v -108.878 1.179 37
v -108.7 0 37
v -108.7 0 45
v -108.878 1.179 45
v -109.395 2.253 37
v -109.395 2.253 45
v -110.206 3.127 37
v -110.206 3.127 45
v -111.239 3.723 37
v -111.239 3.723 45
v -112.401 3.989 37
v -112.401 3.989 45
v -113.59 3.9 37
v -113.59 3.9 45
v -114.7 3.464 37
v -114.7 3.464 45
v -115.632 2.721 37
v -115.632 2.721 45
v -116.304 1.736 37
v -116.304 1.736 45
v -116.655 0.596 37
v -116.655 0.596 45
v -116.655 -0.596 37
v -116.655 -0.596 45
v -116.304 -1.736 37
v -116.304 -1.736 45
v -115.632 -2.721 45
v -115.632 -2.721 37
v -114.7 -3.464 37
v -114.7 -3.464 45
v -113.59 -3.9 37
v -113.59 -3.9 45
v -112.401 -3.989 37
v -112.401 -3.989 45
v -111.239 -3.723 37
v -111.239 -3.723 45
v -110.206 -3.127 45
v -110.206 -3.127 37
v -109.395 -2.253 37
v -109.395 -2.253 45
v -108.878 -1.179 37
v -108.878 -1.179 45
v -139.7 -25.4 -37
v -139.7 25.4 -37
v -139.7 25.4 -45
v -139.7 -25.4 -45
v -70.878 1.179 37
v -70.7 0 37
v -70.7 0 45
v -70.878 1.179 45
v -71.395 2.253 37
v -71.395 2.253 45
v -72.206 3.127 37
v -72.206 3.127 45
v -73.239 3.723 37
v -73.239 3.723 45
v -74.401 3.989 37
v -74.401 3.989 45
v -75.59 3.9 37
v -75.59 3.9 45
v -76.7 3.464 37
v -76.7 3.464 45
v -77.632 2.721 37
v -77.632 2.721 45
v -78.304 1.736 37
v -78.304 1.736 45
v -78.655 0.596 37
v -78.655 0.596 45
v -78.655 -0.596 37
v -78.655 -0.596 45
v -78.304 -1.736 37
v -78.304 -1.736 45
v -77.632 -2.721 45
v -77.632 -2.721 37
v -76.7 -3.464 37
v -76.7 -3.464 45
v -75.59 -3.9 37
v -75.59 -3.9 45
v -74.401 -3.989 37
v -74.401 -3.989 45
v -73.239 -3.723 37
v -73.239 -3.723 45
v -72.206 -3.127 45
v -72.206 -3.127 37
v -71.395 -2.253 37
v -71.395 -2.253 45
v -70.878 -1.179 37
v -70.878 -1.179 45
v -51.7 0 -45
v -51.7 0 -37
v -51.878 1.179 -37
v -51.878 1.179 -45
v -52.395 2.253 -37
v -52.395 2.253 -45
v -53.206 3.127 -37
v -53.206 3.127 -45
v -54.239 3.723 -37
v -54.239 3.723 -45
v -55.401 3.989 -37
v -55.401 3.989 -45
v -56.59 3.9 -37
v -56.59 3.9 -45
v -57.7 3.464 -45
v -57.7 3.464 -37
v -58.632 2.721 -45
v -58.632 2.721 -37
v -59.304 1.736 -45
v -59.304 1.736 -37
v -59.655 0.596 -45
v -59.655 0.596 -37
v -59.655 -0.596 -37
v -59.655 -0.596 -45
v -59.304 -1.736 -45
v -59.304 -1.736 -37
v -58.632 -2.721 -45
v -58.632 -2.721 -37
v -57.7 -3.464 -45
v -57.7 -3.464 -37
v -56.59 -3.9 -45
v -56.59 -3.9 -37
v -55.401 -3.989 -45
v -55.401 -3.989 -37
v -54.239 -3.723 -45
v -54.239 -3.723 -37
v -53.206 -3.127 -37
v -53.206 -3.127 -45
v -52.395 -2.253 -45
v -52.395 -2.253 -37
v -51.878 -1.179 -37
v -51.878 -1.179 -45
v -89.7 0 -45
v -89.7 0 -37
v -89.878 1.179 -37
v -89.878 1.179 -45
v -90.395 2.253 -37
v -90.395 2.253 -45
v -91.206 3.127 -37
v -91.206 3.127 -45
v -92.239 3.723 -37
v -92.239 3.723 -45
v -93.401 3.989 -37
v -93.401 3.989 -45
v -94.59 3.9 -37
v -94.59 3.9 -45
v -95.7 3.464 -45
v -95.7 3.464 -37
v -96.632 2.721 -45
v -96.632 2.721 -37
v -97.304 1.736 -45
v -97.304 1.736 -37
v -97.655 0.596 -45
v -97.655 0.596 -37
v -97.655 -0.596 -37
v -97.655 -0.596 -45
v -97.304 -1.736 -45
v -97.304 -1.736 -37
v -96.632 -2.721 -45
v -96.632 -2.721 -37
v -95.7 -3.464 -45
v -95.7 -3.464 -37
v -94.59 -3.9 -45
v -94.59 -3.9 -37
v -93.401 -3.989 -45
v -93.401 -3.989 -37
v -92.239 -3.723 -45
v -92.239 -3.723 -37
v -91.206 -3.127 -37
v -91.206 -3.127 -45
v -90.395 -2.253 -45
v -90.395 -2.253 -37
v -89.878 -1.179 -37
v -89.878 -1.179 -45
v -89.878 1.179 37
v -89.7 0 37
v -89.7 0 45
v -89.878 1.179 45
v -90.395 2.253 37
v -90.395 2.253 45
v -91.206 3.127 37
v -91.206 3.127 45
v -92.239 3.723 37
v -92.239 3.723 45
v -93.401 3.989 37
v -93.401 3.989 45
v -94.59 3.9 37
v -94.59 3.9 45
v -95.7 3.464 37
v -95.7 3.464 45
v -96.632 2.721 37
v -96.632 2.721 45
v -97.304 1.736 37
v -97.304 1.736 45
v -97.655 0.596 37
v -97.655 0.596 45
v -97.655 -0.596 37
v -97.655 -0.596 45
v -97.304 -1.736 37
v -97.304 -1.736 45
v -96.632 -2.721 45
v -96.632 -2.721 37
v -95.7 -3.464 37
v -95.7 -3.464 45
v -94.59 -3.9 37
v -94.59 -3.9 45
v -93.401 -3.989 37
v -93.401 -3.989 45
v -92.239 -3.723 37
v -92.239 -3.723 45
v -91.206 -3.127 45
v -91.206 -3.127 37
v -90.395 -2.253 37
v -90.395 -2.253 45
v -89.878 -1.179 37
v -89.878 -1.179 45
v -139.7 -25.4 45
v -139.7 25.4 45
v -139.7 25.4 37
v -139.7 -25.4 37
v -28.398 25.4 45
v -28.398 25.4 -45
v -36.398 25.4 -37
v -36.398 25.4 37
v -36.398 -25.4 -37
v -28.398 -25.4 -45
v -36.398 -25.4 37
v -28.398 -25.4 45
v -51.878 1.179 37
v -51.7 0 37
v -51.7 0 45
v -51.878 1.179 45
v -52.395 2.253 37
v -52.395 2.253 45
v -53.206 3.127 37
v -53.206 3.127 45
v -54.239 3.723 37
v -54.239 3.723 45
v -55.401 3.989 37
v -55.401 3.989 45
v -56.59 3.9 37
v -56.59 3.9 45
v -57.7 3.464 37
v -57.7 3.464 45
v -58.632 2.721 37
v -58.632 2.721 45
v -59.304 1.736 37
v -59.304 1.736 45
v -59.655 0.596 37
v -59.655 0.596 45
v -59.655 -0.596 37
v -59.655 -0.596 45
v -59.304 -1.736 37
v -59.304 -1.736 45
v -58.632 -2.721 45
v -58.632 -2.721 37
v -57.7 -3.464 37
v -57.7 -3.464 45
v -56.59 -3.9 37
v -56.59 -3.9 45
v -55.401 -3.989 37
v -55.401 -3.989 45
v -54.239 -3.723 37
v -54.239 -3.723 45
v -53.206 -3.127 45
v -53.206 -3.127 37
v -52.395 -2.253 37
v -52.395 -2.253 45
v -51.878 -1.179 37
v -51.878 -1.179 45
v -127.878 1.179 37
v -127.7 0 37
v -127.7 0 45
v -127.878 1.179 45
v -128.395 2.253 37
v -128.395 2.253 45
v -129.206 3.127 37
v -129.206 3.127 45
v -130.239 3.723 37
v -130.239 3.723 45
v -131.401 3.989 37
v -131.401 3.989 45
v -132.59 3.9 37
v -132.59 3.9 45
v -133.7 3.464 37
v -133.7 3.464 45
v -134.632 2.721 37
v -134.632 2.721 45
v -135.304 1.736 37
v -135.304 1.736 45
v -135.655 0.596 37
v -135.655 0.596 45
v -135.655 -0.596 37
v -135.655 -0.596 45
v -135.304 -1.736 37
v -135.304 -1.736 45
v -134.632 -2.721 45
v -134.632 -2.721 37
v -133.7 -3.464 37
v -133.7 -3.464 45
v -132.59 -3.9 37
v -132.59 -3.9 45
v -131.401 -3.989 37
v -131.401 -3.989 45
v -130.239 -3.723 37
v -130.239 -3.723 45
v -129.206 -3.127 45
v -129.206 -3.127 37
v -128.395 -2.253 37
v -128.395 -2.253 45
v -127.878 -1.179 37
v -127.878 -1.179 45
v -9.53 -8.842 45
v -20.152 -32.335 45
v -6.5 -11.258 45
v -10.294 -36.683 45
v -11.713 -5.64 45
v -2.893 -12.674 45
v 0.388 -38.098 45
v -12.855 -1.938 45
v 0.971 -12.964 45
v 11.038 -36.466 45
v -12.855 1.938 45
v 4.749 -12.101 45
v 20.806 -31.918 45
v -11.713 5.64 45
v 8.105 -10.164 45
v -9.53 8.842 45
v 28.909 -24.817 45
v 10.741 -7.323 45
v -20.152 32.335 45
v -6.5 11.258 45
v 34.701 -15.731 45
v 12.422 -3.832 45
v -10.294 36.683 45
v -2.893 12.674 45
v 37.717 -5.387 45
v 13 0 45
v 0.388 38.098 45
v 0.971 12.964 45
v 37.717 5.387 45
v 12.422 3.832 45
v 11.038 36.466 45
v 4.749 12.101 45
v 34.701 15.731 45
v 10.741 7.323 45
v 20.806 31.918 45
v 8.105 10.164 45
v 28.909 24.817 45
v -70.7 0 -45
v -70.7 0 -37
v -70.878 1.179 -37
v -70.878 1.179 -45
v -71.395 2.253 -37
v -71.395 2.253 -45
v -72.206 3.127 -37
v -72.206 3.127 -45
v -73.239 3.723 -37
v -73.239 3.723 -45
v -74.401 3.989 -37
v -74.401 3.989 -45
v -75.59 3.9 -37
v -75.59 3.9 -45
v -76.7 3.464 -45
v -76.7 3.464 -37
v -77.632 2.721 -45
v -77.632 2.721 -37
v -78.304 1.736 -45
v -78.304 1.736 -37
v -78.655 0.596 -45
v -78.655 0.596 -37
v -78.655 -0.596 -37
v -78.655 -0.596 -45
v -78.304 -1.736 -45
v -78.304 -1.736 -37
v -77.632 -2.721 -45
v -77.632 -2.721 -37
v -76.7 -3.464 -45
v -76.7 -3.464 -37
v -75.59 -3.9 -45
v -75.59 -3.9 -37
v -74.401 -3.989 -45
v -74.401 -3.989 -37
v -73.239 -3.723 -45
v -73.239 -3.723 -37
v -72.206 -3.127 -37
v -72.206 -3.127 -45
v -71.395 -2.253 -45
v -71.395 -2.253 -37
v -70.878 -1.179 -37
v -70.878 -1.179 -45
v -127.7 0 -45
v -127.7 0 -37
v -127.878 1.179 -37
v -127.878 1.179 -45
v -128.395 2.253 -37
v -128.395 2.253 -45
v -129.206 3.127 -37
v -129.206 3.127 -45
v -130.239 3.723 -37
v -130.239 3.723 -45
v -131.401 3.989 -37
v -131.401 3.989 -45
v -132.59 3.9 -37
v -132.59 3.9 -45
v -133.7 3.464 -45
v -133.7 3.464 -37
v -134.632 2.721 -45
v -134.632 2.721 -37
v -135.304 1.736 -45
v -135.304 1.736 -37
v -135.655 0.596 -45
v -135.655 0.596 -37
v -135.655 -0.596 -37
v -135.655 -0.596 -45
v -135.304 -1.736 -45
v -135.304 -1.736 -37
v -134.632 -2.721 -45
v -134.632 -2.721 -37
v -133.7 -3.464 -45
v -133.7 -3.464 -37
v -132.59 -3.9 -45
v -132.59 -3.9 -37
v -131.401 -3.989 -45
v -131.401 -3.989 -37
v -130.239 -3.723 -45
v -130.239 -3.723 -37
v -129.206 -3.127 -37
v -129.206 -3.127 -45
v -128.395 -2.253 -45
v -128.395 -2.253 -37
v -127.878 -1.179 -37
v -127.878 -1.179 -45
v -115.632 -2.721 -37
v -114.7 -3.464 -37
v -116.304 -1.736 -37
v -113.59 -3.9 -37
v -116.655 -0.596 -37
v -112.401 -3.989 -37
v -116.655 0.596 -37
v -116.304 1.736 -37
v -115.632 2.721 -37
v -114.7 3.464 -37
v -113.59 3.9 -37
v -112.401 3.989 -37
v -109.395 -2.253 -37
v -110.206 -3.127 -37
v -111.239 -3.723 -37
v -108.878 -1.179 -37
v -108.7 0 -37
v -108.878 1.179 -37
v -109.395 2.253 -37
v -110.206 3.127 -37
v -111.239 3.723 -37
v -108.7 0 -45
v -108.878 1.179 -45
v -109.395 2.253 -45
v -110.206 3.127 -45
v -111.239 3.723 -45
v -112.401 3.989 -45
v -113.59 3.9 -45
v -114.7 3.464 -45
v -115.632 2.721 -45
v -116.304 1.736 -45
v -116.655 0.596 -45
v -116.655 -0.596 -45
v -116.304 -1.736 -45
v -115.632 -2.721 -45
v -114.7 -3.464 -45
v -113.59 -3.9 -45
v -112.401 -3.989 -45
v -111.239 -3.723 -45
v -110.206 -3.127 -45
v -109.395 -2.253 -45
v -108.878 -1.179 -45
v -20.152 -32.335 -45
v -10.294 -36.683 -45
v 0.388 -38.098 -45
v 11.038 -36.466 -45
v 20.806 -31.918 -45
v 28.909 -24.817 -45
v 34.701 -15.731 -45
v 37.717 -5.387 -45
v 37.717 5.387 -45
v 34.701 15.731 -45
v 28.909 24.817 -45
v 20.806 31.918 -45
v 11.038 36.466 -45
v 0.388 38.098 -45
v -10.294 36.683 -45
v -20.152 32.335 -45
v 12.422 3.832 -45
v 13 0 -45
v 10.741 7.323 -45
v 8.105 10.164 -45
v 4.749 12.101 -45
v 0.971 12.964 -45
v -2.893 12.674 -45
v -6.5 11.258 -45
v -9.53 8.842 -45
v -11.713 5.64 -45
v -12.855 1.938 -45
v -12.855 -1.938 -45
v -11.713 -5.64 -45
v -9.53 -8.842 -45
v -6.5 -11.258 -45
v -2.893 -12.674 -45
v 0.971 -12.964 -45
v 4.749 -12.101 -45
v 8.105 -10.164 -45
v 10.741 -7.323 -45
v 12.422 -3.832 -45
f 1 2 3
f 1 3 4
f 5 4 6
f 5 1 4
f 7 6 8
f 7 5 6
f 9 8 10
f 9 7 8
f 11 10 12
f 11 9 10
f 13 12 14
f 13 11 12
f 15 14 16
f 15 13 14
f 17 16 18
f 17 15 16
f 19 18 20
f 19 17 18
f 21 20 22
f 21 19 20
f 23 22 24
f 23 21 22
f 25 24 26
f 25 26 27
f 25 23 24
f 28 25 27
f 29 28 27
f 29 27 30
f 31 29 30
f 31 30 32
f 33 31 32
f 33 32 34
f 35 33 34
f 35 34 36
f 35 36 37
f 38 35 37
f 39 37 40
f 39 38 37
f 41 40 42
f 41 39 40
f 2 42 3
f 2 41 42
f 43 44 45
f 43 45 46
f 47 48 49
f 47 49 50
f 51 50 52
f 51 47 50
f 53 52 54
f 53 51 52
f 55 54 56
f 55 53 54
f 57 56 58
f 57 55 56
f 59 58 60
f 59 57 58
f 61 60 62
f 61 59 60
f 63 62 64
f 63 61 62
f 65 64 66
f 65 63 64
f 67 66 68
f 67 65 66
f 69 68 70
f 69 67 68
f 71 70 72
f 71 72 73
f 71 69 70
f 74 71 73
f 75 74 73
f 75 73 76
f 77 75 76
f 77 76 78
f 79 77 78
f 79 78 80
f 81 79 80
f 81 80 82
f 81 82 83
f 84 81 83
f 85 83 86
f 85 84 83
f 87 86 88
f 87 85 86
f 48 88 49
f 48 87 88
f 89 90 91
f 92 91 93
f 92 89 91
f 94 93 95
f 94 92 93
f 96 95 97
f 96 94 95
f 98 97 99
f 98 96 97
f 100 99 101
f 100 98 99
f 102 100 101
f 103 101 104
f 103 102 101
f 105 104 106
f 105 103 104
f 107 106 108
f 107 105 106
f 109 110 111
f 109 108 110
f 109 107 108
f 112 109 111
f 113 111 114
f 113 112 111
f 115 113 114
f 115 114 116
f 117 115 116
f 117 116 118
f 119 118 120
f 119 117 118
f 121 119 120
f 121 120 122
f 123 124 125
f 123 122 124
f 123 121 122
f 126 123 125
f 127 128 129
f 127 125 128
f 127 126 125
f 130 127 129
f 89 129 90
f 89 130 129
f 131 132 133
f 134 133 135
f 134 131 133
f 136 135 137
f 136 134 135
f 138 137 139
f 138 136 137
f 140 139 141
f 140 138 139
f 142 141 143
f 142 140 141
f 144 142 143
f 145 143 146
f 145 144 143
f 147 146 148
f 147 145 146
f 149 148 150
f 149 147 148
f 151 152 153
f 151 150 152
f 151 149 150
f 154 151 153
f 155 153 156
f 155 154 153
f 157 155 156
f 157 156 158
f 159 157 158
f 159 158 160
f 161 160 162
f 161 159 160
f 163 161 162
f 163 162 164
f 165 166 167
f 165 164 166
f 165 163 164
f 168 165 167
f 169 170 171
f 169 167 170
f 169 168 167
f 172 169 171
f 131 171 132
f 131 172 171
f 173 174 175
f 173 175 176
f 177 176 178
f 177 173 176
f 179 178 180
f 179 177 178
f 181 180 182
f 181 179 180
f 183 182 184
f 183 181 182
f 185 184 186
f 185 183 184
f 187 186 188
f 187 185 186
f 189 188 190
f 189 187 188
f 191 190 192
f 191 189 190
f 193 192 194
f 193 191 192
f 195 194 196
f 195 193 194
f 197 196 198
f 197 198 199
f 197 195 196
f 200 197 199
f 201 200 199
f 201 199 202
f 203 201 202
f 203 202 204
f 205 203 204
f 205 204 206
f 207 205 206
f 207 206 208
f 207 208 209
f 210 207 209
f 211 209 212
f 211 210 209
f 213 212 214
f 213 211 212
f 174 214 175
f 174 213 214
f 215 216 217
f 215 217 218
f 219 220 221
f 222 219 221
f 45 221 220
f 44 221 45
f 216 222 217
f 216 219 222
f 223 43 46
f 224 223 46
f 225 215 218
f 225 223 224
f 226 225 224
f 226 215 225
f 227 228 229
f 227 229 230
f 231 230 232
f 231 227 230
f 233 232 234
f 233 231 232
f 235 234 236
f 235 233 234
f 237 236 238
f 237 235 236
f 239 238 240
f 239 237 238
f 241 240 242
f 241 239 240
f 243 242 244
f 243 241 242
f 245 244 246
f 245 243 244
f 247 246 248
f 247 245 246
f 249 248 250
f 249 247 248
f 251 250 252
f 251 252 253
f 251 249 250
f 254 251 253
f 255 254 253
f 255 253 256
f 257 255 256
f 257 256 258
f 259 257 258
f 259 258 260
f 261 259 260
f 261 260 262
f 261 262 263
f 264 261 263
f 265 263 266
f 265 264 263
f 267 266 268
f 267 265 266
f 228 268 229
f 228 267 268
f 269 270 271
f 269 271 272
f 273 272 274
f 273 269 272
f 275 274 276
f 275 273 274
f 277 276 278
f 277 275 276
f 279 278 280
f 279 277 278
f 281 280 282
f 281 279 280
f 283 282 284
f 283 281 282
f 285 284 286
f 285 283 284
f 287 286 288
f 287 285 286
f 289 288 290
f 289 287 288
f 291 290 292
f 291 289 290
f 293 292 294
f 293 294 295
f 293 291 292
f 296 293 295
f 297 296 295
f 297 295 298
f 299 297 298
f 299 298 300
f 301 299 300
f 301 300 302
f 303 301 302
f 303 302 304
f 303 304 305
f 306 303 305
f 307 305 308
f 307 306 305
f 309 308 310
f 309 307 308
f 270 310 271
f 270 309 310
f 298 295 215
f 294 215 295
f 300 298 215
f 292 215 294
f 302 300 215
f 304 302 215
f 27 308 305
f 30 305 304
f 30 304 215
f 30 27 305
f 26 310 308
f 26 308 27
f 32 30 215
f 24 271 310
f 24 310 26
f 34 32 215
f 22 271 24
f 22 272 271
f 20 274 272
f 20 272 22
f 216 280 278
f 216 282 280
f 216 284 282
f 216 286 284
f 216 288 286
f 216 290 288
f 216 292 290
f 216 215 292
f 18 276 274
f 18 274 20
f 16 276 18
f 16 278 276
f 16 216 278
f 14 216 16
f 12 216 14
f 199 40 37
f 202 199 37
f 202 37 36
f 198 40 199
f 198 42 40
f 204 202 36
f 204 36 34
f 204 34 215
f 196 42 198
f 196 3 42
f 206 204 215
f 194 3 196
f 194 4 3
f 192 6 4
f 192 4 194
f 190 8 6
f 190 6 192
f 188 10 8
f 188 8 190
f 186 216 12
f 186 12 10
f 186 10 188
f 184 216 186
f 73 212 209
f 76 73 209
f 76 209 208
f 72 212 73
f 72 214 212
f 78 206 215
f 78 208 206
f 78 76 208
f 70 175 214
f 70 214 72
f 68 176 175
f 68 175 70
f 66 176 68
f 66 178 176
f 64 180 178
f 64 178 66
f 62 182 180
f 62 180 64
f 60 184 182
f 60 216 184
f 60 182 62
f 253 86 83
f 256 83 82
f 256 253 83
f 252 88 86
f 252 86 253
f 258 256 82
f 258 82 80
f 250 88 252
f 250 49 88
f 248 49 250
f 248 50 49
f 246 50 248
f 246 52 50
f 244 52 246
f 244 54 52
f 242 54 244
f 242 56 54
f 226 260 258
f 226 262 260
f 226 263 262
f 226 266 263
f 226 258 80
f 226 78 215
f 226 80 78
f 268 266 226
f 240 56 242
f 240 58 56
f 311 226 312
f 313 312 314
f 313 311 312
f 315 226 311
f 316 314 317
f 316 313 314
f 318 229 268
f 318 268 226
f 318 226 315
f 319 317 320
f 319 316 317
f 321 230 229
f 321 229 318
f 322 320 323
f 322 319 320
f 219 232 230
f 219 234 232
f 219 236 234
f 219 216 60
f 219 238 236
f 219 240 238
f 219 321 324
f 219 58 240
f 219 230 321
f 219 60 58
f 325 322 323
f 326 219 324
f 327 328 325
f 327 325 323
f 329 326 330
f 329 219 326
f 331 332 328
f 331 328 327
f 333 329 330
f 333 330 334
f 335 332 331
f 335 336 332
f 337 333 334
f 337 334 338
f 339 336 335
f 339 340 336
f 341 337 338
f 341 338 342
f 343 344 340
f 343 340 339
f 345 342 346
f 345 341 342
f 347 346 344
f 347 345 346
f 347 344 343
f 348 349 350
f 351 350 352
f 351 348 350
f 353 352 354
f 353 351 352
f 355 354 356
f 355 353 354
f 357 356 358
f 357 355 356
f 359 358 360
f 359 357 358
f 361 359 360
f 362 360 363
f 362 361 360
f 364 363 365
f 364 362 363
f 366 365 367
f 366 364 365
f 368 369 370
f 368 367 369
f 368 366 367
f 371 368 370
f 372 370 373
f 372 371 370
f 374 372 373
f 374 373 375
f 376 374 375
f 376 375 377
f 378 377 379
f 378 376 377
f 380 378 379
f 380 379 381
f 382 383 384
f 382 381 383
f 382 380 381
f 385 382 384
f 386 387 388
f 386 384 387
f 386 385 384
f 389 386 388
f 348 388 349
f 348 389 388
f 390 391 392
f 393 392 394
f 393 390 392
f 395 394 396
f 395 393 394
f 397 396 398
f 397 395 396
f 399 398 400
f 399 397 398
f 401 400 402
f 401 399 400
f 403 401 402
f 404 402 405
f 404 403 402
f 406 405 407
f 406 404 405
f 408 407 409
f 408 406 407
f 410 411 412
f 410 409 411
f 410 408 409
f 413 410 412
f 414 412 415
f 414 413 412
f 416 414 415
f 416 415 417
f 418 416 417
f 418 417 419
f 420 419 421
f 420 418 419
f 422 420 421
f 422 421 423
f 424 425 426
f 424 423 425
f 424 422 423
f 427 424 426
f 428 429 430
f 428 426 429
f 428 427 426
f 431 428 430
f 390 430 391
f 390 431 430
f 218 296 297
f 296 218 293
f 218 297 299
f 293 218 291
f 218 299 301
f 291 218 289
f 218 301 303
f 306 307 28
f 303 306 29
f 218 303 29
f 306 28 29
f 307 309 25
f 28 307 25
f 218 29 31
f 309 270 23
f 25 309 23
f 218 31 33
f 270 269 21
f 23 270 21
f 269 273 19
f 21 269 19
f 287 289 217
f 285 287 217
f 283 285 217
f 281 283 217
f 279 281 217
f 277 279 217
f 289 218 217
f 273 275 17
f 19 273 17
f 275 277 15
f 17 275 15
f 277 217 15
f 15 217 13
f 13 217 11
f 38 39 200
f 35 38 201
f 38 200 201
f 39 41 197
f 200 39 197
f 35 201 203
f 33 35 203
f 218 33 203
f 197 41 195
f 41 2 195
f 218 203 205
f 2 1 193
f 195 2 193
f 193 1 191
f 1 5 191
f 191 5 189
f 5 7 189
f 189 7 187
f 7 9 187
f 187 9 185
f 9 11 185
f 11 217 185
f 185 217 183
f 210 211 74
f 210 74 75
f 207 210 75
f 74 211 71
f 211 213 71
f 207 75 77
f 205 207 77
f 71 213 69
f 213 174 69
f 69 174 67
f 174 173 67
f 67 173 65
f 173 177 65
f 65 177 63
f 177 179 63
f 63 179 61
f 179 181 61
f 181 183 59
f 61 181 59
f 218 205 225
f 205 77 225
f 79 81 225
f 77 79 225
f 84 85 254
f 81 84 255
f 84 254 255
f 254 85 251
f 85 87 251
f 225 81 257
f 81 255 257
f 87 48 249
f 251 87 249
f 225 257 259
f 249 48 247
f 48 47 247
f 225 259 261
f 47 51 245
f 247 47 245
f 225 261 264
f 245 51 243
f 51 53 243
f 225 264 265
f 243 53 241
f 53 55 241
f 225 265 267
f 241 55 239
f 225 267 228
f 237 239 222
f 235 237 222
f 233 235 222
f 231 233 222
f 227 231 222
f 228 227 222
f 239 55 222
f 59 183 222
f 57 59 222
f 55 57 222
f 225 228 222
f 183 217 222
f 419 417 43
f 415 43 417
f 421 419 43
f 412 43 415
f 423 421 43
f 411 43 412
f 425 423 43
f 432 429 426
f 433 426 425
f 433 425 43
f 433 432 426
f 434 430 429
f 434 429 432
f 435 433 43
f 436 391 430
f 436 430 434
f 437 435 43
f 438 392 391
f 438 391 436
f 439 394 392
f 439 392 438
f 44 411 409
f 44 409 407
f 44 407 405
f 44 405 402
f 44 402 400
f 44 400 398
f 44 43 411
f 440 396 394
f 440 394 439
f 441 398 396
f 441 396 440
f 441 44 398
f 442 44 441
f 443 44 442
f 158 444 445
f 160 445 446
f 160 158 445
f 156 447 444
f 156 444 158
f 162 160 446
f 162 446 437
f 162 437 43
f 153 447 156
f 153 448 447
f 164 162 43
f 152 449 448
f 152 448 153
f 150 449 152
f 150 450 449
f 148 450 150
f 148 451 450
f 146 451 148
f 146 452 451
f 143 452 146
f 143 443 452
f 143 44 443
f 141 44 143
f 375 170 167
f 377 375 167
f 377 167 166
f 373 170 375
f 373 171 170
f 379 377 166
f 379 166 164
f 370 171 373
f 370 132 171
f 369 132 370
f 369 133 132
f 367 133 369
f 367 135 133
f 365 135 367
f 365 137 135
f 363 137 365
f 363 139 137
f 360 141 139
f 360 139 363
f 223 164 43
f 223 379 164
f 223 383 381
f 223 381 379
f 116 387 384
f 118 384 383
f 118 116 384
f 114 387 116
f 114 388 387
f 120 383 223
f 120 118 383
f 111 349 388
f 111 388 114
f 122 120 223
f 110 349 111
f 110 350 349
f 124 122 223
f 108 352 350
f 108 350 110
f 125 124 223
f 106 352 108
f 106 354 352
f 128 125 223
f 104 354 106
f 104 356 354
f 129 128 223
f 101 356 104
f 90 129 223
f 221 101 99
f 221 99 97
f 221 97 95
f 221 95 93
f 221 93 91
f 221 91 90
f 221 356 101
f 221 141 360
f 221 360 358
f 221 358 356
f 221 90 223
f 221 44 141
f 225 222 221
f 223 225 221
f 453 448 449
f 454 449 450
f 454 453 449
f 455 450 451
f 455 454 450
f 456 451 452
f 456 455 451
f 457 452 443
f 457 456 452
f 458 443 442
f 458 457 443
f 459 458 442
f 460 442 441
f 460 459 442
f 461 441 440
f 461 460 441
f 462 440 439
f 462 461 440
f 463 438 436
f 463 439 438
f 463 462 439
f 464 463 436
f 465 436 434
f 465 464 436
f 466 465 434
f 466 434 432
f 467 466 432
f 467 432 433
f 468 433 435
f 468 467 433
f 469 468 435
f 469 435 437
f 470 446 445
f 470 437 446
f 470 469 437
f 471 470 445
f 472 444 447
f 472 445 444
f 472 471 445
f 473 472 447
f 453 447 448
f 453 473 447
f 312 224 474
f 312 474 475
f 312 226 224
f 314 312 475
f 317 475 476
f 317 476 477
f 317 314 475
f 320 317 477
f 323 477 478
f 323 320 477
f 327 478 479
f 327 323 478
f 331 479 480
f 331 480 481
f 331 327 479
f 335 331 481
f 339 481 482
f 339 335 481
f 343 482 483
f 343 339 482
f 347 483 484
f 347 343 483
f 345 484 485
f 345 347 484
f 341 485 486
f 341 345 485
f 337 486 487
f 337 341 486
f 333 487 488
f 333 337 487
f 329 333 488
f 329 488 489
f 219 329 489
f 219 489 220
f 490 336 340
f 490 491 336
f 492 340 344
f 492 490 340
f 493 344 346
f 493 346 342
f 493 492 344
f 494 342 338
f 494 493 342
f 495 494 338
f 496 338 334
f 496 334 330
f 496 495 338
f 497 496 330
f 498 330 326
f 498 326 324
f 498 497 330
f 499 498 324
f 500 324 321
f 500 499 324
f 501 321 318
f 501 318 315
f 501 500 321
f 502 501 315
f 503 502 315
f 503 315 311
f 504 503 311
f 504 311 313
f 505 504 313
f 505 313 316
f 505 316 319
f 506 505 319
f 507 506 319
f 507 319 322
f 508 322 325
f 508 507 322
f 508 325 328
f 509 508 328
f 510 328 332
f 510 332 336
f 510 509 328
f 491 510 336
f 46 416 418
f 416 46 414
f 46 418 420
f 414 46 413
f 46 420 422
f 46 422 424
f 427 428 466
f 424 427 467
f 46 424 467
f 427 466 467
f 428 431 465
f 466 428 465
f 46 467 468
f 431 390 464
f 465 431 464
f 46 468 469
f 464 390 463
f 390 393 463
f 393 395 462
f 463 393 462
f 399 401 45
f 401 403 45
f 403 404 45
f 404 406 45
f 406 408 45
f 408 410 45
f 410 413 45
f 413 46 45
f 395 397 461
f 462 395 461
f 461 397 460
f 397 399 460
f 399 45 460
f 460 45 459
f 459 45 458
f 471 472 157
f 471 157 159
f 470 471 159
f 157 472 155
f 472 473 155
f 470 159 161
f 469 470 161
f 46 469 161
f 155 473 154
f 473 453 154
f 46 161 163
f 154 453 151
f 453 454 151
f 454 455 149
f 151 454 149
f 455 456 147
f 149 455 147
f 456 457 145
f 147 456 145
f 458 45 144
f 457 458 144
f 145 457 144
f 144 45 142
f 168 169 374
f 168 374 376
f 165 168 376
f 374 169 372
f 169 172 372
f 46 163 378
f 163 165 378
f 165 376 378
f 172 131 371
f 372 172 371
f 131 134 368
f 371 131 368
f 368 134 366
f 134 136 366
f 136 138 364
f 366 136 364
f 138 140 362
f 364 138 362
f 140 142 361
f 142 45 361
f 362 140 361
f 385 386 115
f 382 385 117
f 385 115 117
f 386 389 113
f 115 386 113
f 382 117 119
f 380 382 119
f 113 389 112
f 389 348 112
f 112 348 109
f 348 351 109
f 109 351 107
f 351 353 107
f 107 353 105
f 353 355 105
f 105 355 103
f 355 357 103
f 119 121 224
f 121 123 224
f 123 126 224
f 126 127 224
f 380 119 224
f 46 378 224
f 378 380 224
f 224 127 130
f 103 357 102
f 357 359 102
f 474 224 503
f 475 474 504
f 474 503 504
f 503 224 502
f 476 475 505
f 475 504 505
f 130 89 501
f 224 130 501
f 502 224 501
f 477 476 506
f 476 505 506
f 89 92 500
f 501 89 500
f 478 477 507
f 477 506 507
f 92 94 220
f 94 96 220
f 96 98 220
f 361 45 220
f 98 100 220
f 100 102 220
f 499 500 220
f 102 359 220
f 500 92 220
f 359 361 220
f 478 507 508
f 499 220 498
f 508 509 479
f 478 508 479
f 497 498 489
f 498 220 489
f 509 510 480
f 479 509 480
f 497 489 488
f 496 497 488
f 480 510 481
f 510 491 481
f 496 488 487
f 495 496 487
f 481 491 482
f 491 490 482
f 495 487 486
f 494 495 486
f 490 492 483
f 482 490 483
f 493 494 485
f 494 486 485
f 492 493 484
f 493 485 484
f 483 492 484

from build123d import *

# Parameters (mm, degrees)
SKETCH1_R               = 13
SKETCH1_R_2             = 4
BOSS_EXTRUDE1_DEPTH     = 45
SKETCH2_W               = 103.301936686
SKETCH2_H               = 74
CUT_EXTRUDE1_DEPTH      = 13.7
CUT_EXTRUDE1_DEPTH_BACK = 64.5


with BuildPart() as part:
    # Sketch1 → Boss-Extrude1 (new body, symmetric)
    with BuildSketch(Plane.XY):
        with BuildLine():
            Line((-28.398063314, 25.4), (-139.7, 25.4))
            Line((-139.7, 25.4), (-139.7, -25.4))
            Line((-139.7, -25.4), (-28.398063314, -25.4))
            ThreePointArc((-28.398063314, -25.4), (38.1, 0), (-28.398063314, 25.4))
        make_face()
        Circle(SKETCH1_R, mode=Mode.SUBTRACT)
        with Locations((-131.7, 0)):
            Circle(SKETCH1_R_2, mode=Mode.SUBTRACT)
        with Locations((-112.7, 0)):
            Circle(SKETCH1_R_2, mode=Mode.SUBTRACT)
        with Locations((-93.7, 0)):
            Circle(SKETCH1_R_2, mode=Mode.SUBTRACT)
        with Locations((-74.7, 0)):
            Circle(SKETCH1_R_2, mode=Mode.SUBTRACT)
        with Locations((-55.7, 0)):
            Circle(SKETCH1_R_2, mode=Mode.SUBTRACT)
    extrude(amount=BOSS_EXTRUDE1_DEPTH, both=True)

    # Sketch2 → Cut-Extrude1 (cut, two sides)
    with BuildSketch(Plane(origin=(0, 25.4, 0), x_dir=(1, 0, 0), z_dir=(0, 1, 0))) as cut_extrude1_sk:
        with Locations((-88.049031657, 0)):
            Rectangle(SKETCH2_W, SKETCH2_H)
    extrude(amount=CUT_EXTRUDE1_DEPTH, mode=Mode.SUBTRACT)
    extrude(cut_extrude1_sk.sketch, amount=-CUT_EXTRUDE1_DEPTH_BACK, mode=Mode.SUBTRACT)


solid = part.part
